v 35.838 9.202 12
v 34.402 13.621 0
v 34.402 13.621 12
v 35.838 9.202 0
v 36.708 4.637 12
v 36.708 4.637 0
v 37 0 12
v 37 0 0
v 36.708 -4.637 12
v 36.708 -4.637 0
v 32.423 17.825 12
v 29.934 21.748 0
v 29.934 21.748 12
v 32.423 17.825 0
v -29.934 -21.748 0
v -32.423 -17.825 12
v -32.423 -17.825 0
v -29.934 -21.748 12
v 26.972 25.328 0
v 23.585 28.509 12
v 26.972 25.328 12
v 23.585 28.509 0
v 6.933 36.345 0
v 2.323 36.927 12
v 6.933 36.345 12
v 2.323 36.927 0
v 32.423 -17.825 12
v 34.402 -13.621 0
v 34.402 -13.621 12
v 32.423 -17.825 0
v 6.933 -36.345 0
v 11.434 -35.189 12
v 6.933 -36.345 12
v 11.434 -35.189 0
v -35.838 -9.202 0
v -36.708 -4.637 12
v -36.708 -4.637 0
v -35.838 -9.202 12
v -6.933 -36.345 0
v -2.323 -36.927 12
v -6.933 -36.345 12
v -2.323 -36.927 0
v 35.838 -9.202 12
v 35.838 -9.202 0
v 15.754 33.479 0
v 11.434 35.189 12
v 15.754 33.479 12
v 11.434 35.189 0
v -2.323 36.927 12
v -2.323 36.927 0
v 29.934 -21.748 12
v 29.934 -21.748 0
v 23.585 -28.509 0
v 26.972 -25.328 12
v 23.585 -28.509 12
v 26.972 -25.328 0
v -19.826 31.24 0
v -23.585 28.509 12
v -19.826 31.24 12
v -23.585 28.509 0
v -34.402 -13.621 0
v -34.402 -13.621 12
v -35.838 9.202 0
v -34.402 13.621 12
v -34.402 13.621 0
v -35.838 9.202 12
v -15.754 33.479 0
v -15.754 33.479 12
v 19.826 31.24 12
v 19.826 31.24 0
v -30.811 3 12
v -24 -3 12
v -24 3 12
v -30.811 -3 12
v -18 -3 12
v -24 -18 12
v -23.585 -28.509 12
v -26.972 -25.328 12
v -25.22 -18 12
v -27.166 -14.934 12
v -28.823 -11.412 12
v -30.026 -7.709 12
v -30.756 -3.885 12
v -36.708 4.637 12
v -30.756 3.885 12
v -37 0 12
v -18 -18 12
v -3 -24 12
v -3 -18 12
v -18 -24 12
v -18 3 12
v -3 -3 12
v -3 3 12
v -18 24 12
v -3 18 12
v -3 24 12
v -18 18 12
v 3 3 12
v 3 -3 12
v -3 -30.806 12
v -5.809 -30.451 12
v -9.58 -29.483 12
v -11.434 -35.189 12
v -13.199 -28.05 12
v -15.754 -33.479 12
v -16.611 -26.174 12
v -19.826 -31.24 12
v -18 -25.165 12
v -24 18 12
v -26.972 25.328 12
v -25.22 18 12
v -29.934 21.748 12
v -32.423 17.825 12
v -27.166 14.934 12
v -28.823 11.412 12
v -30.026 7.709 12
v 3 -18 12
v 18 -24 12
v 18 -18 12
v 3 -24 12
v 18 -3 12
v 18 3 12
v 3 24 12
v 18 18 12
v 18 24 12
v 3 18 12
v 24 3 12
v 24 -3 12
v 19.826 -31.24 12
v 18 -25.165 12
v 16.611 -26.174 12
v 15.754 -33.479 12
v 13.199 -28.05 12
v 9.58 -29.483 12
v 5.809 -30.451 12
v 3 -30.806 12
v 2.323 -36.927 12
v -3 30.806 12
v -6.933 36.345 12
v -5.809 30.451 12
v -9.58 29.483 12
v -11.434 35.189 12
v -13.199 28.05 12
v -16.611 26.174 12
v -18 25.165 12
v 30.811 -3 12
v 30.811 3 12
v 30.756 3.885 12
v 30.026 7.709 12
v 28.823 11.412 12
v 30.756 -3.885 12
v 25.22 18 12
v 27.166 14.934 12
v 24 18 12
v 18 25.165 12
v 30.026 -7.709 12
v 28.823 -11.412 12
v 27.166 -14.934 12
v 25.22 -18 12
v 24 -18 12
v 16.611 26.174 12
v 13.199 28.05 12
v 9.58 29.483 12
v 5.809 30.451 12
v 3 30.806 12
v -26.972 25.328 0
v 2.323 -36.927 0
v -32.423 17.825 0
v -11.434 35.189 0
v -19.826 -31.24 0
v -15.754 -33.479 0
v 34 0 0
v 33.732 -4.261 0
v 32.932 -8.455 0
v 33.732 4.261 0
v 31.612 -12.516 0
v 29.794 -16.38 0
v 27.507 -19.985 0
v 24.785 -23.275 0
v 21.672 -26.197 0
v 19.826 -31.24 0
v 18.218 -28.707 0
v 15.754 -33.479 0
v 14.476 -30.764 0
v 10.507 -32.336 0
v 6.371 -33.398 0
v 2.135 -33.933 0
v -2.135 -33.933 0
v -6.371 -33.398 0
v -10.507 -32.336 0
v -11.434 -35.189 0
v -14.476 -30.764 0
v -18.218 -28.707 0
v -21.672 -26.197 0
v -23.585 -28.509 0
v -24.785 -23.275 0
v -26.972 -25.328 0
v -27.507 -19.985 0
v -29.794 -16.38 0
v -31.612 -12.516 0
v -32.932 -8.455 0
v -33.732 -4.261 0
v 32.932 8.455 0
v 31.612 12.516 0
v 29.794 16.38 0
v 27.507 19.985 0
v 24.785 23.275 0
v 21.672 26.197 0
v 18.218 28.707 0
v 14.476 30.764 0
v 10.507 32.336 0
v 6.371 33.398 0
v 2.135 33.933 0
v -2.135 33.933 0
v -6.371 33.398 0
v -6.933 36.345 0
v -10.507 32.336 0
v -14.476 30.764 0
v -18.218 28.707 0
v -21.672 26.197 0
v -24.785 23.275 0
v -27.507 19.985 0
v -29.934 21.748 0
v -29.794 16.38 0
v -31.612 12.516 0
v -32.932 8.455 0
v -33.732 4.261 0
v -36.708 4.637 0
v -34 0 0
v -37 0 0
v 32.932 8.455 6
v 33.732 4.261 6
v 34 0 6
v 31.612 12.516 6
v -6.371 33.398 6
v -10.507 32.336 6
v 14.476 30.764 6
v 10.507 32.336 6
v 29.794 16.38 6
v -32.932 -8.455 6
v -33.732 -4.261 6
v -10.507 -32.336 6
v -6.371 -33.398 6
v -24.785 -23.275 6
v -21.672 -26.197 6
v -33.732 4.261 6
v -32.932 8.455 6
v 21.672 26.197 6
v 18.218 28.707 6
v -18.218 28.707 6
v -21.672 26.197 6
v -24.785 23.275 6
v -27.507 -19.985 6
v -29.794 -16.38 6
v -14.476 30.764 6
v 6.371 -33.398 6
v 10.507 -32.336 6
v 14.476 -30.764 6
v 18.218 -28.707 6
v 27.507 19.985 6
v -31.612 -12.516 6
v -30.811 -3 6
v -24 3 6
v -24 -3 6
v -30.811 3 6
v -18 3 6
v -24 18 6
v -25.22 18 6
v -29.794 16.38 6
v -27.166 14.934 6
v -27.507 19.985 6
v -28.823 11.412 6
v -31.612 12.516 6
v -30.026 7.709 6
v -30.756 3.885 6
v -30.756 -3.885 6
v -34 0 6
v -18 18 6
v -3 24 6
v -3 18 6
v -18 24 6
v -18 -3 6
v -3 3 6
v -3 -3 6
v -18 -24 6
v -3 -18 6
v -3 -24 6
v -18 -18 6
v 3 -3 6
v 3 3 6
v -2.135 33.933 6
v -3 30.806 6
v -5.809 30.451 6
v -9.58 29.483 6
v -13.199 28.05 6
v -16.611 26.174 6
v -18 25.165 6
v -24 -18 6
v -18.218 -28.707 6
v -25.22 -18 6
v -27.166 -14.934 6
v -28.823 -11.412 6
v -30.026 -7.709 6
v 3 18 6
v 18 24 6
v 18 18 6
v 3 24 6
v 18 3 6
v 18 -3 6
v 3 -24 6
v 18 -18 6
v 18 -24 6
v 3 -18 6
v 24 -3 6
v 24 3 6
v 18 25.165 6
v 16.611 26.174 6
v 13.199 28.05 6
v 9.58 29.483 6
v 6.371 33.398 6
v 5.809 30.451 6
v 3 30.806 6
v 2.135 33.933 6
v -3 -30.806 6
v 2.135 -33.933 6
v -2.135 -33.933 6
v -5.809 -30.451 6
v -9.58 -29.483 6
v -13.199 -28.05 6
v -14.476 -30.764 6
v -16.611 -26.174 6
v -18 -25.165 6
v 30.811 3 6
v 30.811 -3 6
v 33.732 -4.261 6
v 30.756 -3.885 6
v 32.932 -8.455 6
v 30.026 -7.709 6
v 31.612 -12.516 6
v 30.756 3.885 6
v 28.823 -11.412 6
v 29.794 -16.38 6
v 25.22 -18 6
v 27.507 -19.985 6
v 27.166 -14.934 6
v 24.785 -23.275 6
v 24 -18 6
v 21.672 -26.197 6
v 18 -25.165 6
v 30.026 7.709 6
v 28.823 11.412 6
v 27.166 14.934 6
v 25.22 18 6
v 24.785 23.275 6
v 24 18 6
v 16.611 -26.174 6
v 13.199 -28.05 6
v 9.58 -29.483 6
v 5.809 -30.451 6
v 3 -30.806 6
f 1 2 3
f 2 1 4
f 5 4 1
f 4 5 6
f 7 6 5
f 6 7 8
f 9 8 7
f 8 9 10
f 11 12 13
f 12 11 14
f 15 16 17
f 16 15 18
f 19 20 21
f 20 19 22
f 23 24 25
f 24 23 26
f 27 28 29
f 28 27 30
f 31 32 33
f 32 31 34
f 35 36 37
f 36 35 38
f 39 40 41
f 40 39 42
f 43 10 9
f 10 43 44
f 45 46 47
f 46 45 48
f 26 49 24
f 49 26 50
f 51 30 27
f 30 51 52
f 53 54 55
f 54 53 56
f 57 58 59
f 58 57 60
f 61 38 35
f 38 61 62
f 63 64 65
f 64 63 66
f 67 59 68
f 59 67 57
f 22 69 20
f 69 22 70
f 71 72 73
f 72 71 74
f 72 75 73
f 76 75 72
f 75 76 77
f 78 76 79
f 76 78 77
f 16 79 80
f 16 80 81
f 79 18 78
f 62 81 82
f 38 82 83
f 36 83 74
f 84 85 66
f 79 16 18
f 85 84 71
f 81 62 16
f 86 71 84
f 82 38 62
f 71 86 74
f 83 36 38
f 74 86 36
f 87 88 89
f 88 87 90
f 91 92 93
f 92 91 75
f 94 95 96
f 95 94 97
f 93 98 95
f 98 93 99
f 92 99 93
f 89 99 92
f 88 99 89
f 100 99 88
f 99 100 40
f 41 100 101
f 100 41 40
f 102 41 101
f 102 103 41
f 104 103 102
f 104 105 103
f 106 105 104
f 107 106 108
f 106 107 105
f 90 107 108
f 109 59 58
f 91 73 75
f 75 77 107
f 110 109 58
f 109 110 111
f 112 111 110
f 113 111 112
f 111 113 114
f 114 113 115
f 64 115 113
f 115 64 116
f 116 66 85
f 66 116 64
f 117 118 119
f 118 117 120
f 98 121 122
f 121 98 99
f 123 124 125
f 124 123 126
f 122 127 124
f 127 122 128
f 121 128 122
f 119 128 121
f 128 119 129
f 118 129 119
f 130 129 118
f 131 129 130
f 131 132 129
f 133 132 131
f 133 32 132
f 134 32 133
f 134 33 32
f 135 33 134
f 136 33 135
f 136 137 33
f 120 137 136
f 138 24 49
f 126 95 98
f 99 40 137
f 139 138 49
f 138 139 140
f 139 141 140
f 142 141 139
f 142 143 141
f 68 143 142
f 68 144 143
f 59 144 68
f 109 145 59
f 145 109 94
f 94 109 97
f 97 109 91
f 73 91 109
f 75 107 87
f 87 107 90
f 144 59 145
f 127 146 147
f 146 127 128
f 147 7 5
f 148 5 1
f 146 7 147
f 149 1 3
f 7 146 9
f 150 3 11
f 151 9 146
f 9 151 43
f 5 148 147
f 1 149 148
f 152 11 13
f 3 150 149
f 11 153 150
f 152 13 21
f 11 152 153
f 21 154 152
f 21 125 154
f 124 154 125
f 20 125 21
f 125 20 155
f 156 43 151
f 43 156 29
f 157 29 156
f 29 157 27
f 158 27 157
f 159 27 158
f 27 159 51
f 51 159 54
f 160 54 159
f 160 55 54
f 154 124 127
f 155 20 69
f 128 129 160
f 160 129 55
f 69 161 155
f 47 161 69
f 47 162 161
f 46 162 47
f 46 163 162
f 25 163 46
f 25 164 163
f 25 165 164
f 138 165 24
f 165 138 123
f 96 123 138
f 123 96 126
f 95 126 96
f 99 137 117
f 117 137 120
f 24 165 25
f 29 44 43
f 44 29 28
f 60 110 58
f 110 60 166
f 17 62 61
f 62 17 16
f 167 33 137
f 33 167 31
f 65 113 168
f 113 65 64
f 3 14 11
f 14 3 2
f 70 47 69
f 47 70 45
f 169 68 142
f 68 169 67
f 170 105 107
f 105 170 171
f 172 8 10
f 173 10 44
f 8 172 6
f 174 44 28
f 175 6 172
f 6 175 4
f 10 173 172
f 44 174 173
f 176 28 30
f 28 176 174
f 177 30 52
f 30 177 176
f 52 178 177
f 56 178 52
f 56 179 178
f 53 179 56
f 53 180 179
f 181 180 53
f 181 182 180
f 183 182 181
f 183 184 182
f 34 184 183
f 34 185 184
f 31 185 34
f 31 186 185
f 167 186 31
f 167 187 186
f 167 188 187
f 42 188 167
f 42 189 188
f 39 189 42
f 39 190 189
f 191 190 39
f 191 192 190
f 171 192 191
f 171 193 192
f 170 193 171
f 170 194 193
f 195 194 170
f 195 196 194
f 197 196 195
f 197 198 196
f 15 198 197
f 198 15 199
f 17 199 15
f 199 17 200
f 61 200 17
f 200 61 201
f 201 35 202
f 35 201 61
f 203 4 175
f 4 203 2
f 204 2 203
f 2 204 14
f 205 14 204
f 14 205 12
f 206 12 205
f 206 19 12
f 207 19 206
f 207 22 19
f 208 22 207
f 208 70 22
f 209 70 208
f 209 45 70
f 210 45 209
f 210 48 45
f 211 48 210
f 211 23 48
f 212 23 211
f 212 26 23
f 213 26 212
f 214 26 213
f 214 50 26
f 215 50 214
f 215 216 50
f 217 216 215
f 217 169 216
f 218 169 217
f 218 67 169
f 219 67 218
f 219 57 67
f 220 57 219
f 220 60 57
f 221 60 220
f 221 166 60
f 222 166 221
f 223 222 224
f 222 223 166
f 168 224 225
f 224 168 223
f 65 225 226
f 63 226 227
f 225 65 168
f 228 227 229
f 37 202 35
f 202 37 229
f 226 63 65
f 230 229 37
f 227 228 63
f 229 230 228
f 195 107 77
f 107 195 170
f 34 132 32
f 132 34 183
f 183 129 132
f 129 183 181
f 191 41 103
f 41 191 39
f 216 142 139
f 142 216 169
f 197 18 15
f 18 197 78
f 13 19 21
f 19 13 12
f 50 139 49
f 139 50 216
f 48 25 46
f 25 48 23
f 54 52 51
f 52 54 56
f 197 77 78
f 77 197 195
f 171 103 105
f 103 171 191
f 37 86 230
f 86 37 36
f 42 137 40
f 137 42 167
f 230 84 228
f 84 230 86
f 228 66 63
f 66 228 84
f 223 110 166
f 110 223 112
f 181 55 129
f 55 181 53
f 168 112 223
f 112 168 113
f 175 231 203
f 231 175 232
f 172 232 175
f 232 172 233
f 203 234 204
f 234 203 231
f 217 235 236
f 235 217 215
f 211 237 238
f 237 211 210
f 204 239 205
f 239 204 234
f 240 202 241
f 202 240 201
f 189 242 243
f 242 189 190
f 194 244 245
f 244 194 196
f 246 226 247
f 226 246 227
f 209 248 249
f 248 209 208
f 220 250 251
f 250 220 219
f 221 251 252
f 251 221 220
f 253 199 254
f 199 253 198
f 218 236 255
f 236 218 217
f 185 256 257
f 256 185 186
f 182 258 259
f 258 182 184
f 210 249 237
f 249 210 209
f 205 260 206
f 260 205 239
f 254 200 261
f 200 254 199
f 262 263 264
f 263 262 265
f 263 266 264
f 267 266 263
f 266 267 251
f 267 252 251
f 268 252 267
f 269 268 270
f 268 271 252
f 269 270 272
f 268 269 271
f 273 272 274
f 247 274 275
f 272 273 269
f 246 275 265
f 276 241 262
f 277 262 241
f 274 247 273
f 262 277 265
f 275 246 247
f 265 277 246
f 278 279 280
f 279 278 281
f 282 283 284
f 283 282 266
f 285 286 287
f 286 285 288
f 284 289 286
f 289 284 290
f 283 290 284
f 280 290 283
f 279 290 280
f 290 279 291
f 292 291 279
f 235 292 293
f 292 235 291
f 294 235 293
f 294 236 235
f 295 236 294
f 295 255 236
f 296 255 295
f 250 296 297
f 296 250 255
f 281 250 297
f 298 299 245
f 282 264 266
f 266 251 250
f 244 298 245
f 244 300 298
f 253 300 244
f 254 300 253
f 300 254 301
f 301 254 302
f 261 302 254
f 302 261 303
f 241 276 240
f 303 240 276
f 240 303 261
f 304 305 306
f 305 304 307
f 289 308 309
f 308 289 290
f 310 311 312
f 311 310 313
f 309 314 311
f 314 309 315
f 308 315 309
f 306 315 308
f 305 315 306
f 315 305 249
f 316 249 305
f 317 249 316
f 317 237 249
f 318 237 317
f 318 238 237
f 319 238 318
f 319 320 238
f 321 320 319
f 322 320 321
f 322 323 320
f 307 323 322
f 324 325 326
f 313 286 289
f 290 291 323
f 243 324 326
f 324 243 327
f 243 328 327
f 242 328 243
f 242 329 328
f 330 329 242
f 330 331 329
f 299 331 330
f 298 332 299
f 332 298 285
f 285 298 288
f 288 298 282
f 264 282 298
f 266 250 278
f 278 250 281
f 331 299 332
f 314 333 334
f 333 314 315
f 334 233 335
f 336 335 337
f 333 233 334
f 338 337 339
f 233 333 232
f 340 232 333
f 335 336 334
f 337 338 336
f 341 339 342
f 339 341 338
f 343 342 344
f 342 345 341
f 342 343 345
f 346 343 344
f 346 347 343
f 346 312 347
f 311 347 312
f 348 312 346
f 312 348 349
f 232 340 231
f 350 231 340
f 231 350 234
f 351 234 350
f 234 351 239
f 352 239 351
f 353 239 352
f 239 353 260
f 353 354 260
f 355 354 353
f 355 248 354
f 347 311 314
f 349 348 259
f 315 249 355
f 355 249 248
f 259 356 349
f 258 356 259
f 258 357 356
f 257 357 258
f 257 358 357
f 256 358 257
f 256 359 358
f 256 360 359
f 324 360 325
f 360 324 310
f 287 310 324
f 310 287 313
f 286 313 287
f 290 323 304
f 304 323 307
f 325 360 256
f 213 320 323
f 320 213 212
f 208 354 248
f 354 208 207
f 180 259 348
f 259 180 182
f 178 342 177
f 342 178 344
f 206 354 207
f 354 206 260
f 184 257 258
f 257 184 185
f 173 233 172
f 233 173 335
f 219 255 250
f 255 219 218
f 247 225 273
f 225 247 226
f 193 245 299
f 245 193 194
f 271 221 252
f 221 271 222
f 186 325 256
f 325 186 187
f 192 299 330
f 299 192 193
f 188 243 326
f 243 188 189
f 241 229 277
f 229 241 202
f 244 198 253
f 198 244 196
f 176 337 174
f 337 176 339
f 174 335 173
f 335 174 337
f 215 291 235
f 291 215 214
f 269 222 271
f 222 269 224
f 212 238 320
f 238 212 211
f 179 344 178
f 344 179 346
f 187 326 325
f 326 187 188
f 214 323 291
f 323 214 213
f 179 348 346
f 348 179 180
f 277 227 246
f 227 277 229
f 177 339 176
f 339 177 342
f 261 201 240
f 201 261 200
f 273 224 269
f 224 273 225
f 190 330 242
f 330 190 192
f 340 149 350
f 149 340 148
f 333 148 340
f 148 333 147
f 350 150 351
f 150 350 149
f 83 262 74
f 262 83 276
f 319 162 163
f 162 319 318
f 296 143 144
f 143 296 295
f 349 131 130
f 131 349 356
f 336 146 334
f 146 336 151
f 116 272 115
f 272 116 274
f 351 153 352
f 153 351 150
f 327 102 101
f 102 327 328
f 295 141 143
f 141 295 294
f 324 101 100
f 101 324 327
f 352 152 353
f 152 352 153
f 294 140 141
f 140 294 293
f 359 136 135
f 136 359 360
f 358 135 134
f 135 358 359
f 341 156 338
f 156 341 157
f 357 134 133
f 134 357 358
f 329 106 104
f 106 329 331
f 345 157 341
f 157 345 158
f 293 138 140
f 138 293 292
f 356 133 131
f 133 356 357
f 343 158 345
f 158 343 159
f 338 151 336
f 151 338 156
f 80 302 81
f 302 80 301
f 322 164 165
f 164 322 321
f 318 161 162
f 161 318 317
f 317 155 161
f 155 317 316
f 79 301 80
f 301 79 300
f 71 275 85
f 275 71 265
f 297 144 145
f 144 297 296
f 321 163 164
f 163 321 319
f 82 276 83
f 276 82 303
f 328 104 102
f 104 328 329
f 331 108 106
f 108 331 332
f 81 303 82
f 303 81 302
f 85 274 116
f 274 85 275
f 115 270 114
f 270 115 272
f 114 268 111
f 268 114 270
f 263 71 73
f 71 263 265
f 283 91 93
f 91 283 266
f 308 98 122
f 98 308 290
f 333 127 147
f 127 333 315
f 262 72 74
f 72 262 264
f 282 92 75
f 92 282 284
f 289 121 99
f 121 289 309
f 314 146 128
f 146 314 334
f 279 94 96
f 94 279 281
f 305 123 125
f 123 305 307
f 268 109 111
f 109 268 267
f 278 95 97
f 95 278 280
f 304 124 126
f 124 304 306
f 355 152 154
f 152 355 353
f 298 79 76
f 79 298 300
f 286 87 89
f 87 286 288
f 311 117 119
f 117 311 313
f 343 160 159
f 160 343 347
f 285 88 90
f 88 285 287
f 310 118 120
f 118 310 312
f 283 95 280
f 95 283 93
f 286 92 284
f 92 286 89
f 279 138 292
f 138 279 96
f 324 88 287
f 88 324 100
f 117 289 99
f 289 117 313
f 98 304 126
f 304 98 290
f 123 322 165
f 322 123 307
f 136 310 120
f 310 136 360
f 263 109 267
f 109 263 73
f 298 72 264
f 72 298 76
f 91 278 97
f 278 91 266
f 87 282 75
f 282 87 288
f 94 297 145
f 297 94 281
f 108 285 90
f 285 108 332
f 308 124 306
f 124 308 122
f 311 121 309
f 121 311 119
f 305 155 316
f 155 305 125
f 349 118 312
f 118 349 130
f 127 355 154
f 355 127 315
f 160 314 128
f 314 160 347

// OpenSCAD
// Alexander Maricich 2018

// fragment size. Number of sides.
$fn=50;

// Cup values.
cup_diameter = 62;
cup_height = 90;
cup_differential = 6;
cup_thickness = 6;
cup_hole_diameter = 3;

// Lid values.
lid_height = 2*cup_differential;  // must be taller than the cup_differential

// Grid values.
grid_gaps = 15;
grid_thickness=6;


// Create the cup
module toothbrush_cup() {
    difference() {
        // Outer cup
        cylinder(cup_height,
                 d1=cup_diameter-cup_differential,
                 d2=cup_diameter+cup_differential,
                 true);
         
        // Cut-out
        translate([0,0,cup_thickness]) cylinder(cup_height,
                d1=cup_diameter-cup_differential-cup_thickness,
                d2=cup_diameter+cup_differential-cup_thickness,
                true);
        
        translate([0,0,10]) cylinder(cup_height,
                 d=cup_hole_diameter,
                 center=true);
    }
}

//toothbrush_cup();

// Create the lid
module solid_lid() {
    difference() {
        // Outer lid
        cylinder(lid_height,
                 d=cup_diameter+cup_differential+cup_thickness,
                 true);
         
        // Cut-out
        translate([0,0,-cup_thickness]) cylinder(lid_height,
                d=cup_diameter+cup_thickness,
                true);
    }
}

module hole_lid() {
    difference() {
        solid_lid();
         
        // Cut-out
        cylinder(cup_thickness*3,
                d=cup_diameter+cup_differential-cup_thickness,
                true);
    }
}

module toothbrush_lid() {
    difference() {
        solid_lid();
    }
}

//toothbrush_lid();

module bars() {
    for (i = [0:3]) {
        translate([0, i*(grid_gaps+grid_thickness) ,0]) {
            cube([cup_diameter, grid_thickness, cup_height], true);
        }
    }
    for (i = [0:3]) {
        translate([0, -i*(grid_gaps+grid_thickness) ,0]) {
            cube([cup_diameter, grid_thickness, cup_height], true);
        }
    }
}

module grid() {
    union() {
        translate([0,0,cup_thickness]) bars();
        rotate([0,0,90]) translate([0,0,cup_thickness]) bars();
    }
}

module toothbrush_lid() {
    union() {
        hole_lid();
        intersection() {
            solid_lid();
            grid();
        }
    }
}

toothbrush_lid();
//translate([0,0,cup_height+5]) toothbrush_lid();
//toothbrush_cup();
